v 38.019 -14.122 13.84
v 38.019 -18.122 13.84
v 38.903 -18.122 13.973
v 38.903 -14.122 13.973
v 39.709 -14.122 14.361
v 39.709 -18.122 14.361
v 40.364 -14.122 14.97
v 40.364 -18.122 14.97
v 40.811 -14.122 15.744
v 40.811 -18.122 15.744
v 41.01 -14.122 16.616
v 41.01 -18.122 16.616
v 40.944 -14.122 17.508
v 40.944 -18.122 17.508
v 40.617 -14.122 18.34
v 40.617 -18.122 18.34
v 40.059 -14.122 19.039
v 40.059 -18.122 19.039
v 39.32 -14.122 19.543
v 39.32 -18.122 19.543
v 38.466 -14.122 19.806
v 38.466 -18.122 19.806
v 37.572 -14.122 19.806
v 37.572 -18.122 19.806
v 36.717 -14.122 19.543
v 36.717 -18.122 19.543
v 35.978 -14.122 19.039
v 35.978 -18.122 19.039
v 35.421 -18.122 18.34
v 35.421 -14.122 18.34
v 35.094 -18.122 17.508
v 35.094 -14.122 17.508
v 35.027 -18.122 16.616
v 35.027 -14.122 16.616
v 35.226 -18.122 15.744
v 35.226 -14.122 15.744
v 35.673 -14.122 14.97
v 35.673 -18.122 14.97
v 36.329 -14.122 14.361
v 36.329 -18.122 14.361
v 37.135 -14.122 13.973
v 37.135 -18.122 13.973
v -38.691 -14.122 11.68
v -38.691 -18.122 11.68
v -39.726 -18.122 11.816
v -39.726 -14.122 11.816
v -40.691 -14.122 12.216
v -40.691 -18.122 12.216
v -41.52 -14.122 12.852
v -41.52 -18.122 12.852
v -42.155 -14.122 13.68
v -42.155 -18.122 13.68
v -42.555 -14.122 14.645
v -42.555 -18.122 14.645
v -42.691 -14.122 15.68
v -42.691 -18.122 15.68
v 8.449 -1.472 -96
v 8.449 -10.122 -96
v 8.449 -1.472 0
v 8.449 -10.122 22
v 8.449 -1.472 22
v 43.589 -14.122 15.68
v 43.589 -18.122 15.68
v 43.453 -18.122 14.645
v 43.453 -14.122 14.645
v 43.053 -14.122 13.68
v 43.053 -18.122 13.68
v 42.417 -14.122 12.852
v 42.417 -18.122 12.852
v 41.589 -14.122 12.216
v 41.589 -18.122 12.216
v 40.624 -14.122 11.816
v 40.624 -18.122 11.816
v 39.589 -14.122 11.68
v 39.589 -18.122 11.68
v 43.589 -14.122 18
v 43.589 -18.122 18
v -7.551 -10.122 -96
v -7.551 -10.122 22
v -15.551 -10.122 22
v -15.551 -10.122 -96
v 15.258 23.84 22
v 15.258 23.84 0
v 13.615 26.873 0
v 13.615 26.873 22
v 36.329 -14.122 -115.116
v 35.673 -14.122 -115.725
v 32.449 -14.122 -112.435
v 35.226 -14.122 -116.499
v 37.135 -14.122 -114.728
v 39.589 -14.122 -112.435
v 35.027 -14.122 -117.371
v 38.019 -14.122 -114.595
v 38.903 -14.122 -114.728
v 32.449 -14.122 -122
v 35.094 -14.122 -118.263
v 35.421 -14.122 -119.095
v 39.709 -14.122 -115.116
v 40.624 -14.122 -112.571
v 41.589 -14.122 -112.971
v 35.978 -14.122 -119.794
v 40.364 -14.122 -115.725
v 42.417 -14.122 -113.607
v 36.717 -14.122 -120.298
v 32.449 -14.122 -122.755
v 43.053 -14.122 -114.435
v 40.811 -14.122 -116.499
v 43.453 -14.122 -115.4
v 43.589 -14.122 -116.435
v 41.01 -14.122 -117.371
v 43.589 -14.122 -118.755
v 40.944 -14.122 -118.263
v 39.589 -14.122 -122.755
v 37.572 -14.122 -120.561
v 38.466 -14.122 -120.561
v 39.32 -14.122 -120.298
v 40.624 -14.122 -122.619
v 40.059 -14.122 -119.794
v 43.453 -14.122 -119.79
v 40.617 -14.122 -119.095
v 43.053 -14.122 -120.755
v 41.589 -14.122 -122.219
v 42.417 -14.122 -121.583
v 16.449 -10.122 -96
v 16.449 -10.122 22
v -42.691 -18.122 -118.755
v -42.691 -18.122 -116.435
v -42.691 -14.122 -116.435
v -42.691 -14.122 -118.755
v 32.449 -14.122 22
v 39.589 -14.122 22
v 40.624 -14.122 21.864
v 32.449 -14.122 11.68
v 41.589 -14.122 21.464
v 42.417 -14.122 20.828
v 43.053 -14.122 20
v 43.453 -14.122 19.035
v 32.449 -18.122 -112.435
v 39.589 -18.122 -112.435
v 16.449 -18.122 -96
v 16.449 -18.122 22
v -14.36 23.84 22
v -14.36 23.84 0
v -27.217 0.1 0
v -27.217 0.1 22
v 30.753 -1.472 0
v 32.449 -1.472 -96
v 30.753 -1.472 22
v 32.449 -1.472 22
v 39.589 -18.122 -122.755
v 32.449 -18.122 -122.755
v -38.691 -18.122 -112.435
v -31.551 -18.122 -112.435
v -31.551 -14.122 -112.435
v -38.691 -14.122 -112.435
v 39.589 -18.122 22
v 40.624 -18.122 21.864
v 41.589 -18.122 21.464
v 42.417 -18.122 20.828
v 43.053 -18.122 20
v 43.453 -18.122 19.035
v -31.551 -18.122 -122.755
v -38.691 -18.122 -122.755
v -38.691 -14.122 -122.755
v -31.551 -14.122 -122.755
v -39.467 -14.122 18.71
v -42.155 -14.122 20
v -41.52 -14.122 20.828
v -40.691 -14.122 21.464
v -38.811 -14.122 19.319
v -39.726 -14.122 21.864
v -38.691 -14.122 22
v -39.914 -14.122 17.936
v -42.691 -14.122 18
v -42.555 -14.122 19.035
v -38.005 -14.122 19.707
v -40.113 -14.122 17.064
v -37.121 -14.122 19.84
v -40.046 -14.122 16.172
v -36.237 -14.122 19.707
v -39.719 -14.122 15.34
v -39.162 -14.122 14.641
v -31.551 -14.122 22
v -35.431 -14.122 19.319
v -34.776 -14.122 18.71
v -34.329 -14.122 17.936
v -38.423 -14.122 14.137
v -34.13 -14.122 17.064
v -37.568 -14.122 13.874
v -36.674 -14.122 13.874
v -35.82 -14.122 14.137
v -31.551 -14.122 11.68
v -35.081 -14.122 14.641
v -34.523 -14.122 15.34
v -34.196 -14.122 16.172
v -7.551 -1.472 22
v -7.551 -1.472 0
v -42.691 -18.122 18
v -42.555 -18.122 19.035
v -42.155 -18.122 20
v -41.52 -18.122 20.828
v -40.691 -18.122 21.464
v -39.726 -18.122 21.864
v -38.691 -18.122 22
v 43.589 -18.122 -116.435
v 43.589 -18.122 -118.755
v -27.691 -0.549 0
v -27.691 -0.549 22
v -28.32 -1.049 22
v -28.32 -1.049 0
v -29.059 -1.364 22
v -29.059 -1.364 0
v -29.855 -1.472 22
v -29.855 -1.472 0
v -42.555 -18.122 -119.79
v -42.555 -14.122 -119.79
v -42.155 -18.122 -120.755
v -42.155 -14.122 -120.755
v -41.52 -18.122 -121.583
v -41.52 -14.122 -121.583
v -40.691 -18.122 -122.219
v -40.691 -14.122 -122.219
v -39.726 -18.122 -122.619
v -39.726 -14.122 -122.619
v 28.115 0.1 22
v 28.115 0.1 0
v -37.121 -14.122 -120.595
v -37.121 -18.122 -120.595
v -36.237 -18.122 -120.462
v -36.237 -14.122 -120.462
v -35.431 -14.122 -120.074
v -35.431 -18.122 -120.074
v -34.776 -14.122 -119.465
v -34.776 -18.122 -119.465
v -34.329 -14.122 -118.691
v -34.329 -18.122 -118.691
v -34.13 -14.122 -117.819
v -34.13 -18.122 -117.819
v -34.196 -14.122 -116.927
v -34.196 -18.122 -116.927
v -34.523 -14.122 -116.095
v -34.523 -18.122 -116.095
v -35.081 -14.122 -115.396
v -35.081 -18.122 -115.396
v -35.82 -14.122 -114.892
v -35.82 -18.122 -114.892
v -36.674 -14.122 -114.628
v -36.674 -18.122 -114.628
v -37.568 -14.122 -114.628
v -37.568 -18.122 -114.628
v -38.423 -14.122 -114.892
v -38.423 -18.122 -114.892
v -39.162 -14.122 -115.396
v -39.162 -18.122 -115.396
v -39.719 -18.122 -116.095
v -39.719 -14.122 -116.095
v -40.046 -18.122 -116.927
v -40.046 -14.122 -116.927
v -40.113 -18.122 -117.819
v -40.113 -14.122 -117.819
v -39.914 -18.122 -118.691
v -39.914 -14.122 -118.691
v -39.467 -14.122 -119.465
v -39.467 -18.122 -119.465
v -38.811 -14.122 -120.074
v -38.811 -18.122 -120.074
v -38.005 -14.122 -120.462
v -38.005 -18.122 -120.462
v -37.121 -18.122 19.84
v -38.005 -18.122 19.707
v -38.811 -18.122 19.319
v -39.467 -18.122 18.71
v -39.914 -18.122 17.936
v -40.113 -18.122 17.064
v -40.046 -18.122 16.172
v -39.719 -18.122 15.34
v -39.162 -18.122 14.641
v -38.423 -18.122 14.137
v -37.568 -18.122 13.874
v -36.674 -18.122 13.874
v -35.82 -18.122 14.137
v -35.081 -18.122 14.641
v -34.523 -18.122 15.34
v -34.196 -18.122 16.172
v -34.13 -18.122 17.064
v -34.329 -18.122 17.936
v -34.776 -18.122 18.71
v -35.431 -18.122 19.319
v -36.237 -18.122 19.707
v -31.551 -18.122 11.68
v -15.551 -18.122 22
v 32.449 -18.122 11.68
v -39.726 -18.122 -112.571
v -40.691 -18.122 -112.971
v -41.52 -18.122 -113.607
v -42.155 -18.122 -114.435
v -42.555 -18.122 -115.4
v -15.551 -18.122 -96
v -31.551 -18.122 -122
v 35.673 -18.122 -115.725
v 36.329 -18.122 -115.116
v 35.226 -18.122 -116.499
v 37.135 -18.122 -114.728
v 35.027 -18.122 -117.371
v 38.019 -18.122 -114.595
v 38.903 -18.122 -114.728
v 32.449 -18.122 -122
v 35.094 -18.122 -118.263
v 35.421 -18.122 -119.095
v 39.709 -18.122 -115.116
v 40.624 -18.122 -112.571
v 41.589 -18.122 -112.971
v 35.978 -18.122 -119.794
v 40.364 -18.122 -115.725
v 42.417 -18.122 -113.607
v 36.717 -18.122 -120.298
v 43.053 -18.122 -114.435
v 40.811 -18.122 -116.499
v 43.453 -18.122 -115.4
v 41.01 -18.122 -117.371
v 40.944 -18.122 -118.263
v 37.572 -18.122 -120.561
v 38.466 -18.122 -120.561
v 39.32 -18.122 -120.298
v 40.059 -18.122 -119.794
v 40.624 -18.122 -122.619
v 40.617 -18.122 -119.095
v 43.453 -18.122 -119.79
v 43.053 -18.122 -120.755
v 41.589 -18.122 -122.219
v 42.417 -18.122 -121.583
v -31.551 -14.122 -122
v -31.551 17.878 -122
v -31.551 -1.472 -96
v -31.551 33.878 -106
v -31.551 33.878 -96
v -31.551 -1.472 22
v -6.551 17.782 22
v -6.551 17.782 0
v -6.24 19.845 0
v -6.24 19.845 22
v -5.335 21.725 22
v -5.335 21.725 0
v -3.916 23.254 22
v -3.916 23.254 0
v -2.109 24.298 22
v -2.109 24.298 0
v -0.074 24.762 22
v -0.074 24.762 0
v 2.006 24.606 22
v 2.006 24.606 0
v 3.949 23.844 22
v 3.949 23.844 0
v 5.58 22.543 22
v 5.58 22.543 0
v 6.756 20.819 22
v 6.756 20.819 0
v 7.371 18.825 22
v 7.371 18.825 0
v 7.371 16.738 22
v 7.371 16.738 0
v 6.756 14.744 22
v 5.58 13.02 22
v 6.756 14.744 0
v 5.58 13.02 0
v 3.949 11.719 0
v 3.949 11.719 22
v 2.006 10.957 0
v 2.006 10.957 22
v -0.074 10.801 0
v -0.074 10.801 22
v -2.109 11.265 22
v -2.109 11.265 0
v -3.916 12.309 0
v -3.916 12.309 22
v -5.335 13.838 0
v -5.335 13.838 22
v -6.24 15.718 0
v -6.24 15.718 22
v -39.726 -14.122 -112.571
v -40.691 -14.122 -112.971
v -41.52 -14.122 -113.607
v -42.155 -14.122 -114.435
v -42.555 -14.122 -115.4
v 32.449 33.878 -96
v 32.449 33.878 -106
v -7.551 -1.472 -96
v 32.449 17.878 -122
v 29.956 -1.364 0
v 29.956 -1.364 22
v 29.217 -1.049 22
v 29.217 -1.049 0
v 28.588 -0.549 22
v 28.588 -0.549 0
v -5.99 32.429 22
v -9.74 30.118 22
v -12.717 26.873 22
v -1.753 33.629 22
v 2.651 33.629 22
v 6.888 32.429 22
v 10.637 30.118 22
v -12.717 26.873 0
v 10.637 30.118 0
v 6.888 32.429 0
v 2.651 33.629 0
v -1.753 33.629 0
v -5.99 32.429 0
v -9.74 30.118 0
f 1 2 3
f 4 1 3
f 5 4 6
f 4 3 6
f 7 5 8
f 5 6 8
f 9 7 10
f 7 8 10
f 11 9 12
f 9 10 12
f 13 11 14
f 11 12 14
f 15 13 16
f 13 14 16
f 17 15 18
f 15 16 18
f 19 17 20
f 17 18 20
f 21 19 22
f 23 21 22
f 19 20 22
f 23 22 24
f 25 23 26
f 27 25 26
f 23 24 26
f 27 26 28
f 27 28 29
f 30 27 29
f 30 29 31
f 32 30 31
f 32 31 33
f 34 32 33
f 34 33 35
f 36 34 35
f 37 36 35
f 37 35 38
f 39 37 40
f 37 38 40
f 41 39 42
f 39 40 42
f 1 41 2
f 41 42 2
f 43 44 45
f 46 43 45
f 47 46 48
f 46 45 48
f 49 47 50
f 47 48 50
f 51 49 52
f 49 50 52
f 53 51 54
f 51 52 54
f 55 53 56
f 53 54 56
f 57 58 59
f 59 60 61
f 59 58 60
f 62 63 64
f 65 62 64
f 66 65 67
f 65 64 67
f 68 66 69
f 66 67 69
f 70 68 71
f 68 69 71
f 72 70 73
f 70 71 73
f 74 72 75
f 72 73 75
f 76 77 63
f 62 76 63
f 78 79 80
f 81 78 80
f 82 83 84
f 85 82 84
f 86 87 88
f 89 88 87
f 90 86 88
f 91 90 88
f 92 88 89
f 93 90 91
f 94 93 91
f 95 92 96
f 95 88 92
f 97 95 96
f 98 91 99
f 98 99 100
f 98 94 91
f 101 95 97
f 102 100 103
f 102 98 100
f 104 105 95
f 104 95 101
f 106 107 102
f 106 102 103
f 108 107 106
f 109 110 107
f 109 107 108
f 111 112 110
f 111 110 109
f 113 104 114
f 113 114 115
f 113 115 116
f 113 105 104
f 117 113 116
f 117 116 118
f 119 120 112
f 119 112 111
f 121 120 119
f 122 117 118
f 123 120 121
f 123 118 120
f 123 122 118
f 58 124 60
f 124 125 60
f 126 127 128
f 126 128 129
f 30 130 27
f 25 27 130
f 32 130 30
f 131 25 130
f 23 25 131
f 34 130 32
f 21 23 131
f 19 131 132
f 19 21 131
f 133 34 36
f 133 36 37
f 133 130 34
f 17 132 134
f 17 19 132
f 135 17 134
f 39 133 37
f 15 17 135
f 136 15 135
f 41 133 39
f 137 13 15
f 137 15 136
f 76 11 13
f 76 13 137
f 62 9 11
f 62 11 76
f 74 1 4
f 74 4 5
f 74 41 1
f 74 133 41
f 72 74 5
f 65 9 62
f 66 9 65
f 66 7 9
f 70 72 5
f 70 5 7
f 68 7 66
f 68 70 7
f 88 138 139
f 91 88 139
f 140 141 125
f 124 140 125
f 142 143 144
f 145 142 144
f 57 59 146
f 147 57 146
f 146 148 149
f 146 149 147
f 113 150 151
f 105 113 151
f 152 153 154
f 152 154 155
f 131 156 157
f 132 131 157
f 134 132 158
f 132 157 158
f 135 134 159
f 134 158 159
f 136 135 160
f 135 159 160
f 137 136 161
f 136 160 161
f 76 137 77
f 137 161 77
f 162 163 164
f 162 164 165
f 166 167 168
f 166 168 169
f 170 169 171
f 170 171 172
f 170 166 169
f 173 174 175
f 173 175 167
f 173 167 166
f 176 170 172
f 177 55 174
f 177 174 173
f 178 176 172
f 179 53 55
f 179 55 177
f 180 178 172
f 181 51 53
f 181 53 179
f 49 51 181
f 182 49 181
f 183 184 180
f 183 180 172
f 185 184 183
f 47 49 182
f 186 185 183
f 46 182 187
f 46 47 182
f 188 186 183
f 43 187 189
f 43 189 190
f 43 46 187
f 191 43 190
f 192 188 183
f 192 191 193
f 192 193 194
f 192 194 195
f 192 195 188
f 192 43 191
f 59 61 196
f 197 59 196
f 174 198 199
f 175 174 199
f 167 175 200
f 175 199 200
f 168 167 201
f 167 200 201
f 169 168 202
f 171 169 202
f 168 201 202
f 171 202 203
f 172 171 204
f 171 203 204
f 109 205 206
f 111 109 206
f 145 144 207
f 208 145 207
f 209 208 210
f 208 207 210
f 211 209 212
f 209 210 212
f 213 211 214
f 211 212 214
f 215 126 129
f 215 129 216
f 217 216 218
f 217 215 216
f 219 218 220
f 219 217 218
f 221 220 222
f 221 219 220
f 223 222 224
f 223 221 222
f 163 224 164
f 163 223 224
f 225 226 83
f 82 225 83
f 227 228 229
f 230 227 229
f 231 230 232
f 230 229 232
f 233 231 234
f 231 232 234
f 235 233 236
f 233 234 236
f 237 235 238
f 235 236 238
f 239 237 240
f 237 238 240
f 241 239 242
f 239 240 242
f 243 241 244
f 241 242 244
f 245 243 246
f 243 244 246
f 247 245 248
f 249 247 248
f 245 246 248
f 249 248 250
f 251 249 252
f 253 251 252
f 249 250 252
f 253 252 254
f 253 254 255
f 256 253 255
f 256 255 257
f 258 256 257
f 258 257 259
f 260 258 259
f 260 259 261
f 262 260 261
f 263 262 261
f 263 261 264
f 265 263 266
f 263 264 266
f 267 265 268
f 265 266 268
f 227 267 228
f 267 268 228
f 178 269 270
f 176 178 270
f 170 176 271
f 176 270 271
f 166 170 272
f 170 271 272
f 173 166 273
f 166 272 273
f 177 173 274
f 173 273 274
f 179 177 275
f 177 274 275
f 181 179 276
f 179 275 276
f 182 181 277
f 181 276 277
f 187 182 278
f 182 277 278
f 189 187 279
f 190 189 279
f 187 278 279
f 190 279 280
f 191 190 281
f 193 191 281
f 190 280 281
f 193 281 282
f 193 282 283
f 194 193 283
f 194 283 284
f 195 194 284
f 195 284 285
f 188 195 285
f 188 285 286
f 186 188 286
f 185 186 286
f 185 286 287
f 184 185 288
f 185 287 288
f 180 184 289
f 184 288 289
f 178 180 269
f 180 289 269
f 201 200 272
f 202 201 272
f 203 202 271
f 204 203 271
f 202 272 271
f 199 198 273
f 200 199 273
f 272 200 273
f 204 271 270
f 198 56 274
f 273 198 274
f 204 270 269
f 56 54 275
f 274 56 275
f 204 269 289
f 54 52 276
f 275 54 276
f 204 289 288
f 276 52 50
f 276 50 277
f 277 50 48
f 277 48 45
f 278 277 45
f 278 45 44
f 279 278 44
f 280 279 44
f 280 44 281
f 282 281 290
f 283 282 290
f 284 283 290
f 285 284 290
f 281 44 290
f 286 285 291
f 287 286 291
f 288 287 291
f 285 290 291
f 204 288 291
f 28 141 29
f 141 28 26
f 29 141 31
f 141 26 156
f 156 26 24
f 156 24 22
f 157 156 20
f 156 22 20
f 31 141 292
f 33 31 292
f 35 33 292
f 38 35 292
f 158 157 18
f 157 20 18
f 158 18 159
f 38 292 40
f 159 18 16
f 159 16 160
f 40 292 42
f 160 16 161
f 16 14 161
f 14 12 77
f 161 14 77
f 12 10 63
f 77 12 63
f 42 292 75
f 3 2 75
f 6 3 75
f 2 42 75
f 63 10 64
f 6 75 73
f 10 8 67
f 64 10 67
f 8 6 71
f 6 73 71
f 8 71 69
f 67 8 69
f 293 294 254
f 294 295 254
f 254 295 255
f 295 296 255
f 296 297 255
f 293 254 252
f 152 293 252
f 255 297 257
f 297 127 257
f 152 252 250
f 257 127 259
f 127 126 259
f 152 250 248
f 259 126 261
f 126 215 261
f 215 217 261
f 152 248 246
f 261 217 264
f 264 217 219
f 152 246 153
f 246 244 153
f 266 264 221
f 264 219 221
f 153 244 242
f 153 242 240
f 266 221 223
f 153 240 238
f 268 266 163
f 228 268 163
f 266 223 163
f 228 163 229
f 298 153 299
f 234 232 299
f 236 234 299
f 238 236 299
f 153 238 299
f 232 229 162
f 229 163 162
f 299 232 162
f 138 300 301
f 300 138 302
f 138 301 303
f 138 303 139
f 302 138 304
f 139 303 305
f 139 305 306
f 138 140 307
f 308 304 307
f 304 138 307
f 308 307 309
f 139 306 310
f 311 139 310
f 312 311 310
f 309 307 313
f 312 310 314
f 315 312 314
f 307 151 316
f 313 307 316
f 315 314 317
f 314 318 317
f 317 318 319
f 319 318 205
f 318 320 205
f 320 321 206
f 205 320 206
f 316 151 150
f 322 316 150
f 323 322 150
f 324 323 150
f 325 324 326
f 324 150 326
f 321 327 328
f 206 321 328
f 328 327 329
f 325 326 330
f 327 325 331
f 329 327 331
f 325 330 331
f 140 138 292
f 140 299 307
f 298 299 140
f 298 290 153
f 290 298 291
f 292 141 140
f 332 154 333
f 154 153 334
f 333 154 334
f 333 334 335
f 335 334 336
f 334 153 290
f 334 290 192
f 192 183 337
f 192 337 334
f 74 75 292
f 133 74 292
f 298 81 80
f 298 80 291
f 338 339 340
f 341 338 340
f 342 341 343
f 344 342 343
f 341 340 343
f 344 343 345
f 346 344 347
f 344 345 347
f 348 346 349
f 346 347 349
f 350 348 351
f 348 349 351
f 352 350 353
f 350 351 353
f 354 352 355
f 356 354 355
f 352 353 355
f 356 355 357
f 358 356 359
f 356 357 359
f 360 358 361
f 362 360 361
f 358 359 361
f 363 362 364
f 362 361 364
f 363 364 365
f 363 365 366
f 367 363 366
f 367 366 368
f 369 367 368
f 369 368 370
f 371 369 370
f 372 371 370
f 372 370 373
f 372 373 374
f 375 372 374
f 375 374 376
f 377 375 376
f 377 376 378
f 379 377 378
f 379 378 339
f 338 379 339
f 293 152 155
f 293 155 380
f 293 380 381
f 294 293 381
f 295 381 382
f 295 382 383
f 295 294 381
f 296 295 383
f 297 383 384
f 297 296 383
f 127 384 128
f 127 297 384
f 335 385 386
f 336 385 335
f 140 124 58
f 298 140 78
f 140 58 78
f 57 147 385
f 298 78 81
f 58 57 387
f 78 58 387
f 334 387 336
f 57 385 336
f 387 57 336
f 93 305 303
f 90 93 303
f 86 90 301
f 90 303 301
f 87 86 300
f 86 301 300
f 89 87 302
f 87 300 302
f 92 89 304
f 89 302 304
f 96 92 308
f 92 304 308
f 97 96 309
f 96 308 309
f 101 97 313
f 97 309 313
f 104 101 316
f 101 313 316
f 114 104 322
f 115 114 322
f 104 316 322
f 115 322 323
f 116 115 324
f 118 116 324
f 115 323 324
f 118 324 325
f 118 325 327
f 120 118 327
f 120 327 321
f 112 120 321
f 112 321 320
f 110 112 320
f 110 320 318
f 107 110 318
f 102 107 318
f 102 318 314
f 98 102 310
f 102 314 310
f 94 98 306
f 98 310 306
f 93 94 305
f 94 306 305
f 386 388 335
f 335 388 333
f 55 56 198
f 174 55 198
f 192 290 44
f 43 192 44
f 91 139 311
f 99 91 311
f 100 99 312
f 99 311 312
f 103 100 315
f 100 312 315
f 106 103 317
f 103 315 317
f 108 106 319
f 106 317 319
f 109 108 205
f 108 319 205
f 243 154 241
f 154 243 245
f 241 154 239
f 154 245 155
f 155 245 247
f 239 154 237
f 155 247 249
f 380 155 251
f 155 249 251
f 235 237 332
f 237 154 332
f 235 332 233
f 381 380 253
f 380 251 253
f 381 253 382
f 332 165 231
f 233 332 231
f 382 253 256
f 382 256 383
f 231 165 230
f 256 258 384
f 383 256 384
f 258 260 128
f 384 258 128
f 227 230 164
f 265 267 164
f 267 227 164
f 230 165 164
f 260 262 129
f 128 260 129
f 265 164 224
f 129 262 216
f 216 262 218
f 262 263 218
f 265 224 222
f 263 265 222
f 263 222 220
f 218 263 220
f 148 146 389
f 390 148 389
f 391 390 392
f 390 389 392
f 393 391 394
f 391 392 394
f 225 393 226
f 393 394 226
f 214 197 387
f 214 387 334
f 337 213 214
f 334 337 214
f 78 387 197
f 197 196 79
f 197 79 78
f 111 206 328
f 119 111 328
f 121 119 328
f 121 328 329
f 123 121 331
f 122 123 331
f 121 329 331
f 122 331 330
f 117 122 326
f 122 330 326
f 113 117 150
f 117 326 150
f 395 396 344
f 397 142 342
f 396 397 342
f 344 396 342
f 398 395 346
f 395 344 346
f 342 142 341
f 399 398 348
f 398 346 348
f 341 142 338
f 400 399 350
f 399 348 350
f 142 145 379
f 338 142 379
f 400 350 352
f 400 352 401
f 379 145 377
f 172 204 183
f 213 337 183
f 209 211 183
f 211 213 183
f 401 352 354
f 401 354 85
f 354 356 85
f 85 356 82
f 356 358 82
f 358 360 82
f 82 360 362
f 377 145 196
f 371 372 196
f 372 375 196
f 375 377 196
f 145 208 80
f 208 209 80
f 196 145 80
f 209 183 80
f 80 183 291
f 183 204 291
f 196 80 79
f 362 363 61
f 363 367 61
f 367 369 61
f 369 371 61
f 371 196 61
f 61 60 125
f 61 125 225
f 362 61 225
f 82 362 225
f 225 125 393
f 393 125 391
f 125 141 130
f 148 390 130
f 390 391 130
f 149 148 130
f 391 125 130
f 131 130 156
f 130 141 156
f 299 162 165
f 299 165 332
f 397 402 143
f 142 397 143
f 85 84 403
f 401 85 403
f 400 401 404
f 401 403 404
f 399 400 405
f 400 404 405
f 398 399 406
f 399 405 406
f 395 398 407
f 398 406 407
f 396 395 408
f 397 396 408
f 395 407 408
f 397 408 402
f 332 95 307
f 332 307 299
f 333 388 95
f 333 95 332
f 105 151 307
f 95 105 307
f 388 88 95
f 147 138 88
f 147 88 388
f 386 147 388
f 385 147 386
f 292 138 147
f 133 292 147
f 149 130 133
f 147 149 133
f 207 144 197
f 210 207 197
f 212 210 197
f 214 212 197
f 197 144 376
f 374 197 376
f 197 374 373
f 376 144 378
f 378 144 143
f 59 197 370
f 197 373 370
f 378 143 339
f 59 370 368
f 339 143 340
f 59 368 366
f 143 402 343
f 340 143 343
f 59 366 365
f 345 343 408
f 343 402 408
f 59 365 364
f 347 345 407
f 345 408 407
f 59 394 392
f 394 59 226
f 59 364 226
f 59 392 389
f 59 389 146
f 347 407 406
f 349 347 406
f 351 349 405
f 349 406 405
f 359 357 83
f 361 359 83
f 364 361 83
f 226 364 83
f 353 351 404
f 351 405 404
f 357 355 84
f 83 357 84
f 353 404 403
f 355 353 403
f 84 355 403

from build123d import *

# Parameters (mm, degrees)
BOSS_EXTRUDE1_DEPTH = 22
M16_TAPPED_HOLE1_D  = 14
BOSS_EXTRUDE2_DEPTH = 96
CUT_EXTRUDE1_DEPTH  = 127.957167334
SKETCH8_W           = 64
SKETCH8_H           = 52
BOSS_EXTRUDE3_DEPTH = 26
CHAMFER1_SIZE       = 16
SKETCH11_R          = 3
BOSS_EXTRUDE4_DEPTH = 4


with BuildPart() as part:
    # Sketch1 → Boss-Extrude1 (new body)
    with BuildSketch(Plane.XY):
        with BuildLine():
            Line((-31.551158378, -1.471617029), (-31.551158378, -18.121617029))
            Line((-31.551158378, -18.121617029), (32.448841622, -18.121617029))
            Line((32.448841622, -18.121617029), (32.448841622, -1.471617029))
            Line((32.448841622, -1.471617029), (30.752510469, -1.471617029))
            ThreePointArc((30.752510469, -1.471617029), (29.21725341, -1.04901606), (28.114530432, 0.099725795))
            Line((28.114530432, 0.099725795), (15.257528673, 23.839860621))
            Line((15.257528673, 23.839860621), (13.614601967, 26.873484031))
            ThreePointArc((13.614601967, 26.873484031), (0.448841622, 33.78157804), (-12.716918722, 26.873484031))
            Line((-12.716918722, 26.873484031), (-14.359845428, 23.839860621))
            Line((-14.359845428, 23.839860621), (-27.216847187, 0.099725795))
            ThreePointArc((-27.216847187, 0.099725795), (-28.319570165, -1.04901606), (-29.854827224, -1.471617029))
            Line((-29.854827224, -1.471617029), (-31.551158378, -1.471617029))
        make_face()
    extrude(amount=BOSS_EXTRUDE1_DEPTH)

    # M16 Tapped Hole1 (through all)
    with Locations(Plane.XY.offset(22)):
        with Locations((0.448841622, 17.78157804)):
            Hole(M16_TAPPED_HOLE1_D / 2)

    # Sketch4 → Boss-Extrude2 (add)
    with BuildSketch(Plane.XY):
        Polygon((16.448841622, -18.121617029), (16.448841622, -10.121617029), (8.448841622, -10.121617029), (8.448841622, -1.471617029), (32.448841622, -1.471617029), (32.448841622, -18.121617029), align=None)
        Polygon((-7.551158378, -10.121617029), (-7.551158378, -1.471617029), (-31.551158378, -1.471617029), (-31.551158378, -18.121617029), (-15.551158378, -18.121617029), (-15.551158378, -10.121617029), align=None)
    extrude(amount=-BOSS_EXTRUDE2_DEPTH)

    # Sketch5 → Cut-Extrude1 (cut, through all)
    with BuildSketch(Plane.XY.offset(22)):
        Polygon((-15.551158378, -18.121617029), (16.448841622, -18.121617029), (16.448841622, -10.121617029), (8.448841622, -10.121617029), (8.448841622, -1.471617029), (-7.551158378, -1.471617029), (-7.551158378, -10.121617029), (-15.551158378, -10.121617029), align=None)
    extrude(amount=-CUT_EXTRUDE1_DEPTH, mode=Mode.SUBTRACT)

    # Sketch8 → Boss-Extrude3 (add)
    with BuildSketch(Plane(origin=(0, 0, -96), x_dir=(-1, 0, 0), z_dir=(0, 0, -1))):
        with Locations((-0.448841622, 7.878382971)):
            Rectangle(SKETCH8_W, SKETCH8_H)
    extrude(amount=BOSS_EXTRUDE3_DEPTH)

    # Chamfer1
    chamfer1_edges = [part.edges().sort_by_distance(p)[0] for p in [
        (0.448841622, 33.878382971, -122),
    ]]
    chamfer(chamfer1_edges, length=CHAMFER1_SIZE)

    # Sketch11 → Boss-Extrude4 (add)
    # profile 1 of 4: a face of its own
    with BuildSketch(Plane(origin=(0, -18.121617029, 0), x_dir=(-1, 0, 0), z_dir=(0, -1, 0))):
        with BuildLine():
            Line((-32.448841622, -22), (-39.588841622, -22))
            ThreePointArc((-39.588841622, -22), (-42.417268747, -20.828427125), (-43.588841622, -18))
            Line((-43.588841622, -18), (-43.588841622, -15.68))
            ThreePointArc((-43.588841622, -15.68), (-42.417268747, -12.851572875), (-39.588841622, -11.68))
            Line((-39.588841622, -11.68), (-32.448841622, -11.68))
            Line((-32.448841622, -11.68), (-32.448841622, -22))
        make_face()
        with Locations(Location((-38.018841622, -16.84, 0), (0, 0, 90))):
            Circle(SKETCH11_R, mode=Mode.SUBTRACT)
    # profile 2 of 4: a face of its own
    with BuildSketch(Plane(origin=(0, -18.121617029, 0), x_dir=(-1, 0, 0), z_dir=(0, -1, 0))):
        with BuildLine():
            Line((31.551158378, -11.68), (38.691158378, -11.68))
            ThreePointArc((38.691158378, -11.68), (41.519585502, -12.851572875), (42.691158378, -15.68))
            Line((42.691158378, -15.68), (42.691158378, -18))
            ThreePointArc((42.691158378, -18), (41.519585502, -20.828427125), (38.691158378, -22))
            Line((38.691158378, -22), (31.551158378, -22))
            Line((31.551158378, -22), (31.551158378, -11.68))
        make_face()
        with Locations(Location((37.121158378, -16.84, 0), (0, 0, 270))):
            Circle(SKETCH11_R, mode=Mode.SUBTRACT)
    # profile 3 of 4: a face of its own
    with BuildSketch(Plane(origin=(0, -18.121617029, 0), x_dir=(-1, 0, 0), z_dir=(0, -1, 0))):
        with BuildLine():
            Line((-32.448841622, 112.43498208), (-39.588841622, 112.43498208))
            ThreePointArc((-39.588841622, 112.43498208), (-42.417268747, 113.606554955), (-43.588841622, 116.43498208))
            Line((-43.588841622, 116.43498208), (-43.588841622, 118.75498208))
            ThreePointArc((-43.588841622, 118.75498208), (-42.417268747, 121.583409205), (-39.588841622, 122.75498208))
            Line((-39.588841622, 122.75498208), (-32.448841622, 122.75498208))
            Line((-32.448841622, 122.75498208), (-32.448841622, 112.43498208))
        make_face()
        with Locations(Location((-38.018841622, 117.59498208, 0), (0, 0, 270))):
            Circle(SKETCH11_R, mode=Mode.SUBTRACT)
    # profile 4 of 4: a face of its own
    with BuildSketch(Plane(origin=(0, -18.121617029, 0), x_dir=(-1, 0, 0), z_dir=(0, -1, 0))):
        with BuildLine():
            Line((31.551158378, 122.75498208), (31.551158378, 112.43498208))
            Line((31.551158378, 112.43498208), (38.691158378, 112.43498208))
            ThreePointArc((38.691158378, 112.43498208), (41.519585502, 113.606554955), (42.691158378, 116.43498208))
            Line((42.691158378, 116.43498208), (42.691158378, 118.75498208))
            ThreePointArc((42.691158378, 118.75498208), (41.519585502, 121.583409205), (38.691158378, 122.75498208))
            Line((38.691158378, 122.75498208), (31.551158378, 122.75498208))
        make_face()
        with Locations(Location((37.121158378, 117.59498208, 0), (0, 0, 90))):
            Circle(SKETCH11_R, mode=Mode.SUBTRACT)
    extrude(amount=-BOSS_EXTRUDE4_DEPTH)


solid = part.part
